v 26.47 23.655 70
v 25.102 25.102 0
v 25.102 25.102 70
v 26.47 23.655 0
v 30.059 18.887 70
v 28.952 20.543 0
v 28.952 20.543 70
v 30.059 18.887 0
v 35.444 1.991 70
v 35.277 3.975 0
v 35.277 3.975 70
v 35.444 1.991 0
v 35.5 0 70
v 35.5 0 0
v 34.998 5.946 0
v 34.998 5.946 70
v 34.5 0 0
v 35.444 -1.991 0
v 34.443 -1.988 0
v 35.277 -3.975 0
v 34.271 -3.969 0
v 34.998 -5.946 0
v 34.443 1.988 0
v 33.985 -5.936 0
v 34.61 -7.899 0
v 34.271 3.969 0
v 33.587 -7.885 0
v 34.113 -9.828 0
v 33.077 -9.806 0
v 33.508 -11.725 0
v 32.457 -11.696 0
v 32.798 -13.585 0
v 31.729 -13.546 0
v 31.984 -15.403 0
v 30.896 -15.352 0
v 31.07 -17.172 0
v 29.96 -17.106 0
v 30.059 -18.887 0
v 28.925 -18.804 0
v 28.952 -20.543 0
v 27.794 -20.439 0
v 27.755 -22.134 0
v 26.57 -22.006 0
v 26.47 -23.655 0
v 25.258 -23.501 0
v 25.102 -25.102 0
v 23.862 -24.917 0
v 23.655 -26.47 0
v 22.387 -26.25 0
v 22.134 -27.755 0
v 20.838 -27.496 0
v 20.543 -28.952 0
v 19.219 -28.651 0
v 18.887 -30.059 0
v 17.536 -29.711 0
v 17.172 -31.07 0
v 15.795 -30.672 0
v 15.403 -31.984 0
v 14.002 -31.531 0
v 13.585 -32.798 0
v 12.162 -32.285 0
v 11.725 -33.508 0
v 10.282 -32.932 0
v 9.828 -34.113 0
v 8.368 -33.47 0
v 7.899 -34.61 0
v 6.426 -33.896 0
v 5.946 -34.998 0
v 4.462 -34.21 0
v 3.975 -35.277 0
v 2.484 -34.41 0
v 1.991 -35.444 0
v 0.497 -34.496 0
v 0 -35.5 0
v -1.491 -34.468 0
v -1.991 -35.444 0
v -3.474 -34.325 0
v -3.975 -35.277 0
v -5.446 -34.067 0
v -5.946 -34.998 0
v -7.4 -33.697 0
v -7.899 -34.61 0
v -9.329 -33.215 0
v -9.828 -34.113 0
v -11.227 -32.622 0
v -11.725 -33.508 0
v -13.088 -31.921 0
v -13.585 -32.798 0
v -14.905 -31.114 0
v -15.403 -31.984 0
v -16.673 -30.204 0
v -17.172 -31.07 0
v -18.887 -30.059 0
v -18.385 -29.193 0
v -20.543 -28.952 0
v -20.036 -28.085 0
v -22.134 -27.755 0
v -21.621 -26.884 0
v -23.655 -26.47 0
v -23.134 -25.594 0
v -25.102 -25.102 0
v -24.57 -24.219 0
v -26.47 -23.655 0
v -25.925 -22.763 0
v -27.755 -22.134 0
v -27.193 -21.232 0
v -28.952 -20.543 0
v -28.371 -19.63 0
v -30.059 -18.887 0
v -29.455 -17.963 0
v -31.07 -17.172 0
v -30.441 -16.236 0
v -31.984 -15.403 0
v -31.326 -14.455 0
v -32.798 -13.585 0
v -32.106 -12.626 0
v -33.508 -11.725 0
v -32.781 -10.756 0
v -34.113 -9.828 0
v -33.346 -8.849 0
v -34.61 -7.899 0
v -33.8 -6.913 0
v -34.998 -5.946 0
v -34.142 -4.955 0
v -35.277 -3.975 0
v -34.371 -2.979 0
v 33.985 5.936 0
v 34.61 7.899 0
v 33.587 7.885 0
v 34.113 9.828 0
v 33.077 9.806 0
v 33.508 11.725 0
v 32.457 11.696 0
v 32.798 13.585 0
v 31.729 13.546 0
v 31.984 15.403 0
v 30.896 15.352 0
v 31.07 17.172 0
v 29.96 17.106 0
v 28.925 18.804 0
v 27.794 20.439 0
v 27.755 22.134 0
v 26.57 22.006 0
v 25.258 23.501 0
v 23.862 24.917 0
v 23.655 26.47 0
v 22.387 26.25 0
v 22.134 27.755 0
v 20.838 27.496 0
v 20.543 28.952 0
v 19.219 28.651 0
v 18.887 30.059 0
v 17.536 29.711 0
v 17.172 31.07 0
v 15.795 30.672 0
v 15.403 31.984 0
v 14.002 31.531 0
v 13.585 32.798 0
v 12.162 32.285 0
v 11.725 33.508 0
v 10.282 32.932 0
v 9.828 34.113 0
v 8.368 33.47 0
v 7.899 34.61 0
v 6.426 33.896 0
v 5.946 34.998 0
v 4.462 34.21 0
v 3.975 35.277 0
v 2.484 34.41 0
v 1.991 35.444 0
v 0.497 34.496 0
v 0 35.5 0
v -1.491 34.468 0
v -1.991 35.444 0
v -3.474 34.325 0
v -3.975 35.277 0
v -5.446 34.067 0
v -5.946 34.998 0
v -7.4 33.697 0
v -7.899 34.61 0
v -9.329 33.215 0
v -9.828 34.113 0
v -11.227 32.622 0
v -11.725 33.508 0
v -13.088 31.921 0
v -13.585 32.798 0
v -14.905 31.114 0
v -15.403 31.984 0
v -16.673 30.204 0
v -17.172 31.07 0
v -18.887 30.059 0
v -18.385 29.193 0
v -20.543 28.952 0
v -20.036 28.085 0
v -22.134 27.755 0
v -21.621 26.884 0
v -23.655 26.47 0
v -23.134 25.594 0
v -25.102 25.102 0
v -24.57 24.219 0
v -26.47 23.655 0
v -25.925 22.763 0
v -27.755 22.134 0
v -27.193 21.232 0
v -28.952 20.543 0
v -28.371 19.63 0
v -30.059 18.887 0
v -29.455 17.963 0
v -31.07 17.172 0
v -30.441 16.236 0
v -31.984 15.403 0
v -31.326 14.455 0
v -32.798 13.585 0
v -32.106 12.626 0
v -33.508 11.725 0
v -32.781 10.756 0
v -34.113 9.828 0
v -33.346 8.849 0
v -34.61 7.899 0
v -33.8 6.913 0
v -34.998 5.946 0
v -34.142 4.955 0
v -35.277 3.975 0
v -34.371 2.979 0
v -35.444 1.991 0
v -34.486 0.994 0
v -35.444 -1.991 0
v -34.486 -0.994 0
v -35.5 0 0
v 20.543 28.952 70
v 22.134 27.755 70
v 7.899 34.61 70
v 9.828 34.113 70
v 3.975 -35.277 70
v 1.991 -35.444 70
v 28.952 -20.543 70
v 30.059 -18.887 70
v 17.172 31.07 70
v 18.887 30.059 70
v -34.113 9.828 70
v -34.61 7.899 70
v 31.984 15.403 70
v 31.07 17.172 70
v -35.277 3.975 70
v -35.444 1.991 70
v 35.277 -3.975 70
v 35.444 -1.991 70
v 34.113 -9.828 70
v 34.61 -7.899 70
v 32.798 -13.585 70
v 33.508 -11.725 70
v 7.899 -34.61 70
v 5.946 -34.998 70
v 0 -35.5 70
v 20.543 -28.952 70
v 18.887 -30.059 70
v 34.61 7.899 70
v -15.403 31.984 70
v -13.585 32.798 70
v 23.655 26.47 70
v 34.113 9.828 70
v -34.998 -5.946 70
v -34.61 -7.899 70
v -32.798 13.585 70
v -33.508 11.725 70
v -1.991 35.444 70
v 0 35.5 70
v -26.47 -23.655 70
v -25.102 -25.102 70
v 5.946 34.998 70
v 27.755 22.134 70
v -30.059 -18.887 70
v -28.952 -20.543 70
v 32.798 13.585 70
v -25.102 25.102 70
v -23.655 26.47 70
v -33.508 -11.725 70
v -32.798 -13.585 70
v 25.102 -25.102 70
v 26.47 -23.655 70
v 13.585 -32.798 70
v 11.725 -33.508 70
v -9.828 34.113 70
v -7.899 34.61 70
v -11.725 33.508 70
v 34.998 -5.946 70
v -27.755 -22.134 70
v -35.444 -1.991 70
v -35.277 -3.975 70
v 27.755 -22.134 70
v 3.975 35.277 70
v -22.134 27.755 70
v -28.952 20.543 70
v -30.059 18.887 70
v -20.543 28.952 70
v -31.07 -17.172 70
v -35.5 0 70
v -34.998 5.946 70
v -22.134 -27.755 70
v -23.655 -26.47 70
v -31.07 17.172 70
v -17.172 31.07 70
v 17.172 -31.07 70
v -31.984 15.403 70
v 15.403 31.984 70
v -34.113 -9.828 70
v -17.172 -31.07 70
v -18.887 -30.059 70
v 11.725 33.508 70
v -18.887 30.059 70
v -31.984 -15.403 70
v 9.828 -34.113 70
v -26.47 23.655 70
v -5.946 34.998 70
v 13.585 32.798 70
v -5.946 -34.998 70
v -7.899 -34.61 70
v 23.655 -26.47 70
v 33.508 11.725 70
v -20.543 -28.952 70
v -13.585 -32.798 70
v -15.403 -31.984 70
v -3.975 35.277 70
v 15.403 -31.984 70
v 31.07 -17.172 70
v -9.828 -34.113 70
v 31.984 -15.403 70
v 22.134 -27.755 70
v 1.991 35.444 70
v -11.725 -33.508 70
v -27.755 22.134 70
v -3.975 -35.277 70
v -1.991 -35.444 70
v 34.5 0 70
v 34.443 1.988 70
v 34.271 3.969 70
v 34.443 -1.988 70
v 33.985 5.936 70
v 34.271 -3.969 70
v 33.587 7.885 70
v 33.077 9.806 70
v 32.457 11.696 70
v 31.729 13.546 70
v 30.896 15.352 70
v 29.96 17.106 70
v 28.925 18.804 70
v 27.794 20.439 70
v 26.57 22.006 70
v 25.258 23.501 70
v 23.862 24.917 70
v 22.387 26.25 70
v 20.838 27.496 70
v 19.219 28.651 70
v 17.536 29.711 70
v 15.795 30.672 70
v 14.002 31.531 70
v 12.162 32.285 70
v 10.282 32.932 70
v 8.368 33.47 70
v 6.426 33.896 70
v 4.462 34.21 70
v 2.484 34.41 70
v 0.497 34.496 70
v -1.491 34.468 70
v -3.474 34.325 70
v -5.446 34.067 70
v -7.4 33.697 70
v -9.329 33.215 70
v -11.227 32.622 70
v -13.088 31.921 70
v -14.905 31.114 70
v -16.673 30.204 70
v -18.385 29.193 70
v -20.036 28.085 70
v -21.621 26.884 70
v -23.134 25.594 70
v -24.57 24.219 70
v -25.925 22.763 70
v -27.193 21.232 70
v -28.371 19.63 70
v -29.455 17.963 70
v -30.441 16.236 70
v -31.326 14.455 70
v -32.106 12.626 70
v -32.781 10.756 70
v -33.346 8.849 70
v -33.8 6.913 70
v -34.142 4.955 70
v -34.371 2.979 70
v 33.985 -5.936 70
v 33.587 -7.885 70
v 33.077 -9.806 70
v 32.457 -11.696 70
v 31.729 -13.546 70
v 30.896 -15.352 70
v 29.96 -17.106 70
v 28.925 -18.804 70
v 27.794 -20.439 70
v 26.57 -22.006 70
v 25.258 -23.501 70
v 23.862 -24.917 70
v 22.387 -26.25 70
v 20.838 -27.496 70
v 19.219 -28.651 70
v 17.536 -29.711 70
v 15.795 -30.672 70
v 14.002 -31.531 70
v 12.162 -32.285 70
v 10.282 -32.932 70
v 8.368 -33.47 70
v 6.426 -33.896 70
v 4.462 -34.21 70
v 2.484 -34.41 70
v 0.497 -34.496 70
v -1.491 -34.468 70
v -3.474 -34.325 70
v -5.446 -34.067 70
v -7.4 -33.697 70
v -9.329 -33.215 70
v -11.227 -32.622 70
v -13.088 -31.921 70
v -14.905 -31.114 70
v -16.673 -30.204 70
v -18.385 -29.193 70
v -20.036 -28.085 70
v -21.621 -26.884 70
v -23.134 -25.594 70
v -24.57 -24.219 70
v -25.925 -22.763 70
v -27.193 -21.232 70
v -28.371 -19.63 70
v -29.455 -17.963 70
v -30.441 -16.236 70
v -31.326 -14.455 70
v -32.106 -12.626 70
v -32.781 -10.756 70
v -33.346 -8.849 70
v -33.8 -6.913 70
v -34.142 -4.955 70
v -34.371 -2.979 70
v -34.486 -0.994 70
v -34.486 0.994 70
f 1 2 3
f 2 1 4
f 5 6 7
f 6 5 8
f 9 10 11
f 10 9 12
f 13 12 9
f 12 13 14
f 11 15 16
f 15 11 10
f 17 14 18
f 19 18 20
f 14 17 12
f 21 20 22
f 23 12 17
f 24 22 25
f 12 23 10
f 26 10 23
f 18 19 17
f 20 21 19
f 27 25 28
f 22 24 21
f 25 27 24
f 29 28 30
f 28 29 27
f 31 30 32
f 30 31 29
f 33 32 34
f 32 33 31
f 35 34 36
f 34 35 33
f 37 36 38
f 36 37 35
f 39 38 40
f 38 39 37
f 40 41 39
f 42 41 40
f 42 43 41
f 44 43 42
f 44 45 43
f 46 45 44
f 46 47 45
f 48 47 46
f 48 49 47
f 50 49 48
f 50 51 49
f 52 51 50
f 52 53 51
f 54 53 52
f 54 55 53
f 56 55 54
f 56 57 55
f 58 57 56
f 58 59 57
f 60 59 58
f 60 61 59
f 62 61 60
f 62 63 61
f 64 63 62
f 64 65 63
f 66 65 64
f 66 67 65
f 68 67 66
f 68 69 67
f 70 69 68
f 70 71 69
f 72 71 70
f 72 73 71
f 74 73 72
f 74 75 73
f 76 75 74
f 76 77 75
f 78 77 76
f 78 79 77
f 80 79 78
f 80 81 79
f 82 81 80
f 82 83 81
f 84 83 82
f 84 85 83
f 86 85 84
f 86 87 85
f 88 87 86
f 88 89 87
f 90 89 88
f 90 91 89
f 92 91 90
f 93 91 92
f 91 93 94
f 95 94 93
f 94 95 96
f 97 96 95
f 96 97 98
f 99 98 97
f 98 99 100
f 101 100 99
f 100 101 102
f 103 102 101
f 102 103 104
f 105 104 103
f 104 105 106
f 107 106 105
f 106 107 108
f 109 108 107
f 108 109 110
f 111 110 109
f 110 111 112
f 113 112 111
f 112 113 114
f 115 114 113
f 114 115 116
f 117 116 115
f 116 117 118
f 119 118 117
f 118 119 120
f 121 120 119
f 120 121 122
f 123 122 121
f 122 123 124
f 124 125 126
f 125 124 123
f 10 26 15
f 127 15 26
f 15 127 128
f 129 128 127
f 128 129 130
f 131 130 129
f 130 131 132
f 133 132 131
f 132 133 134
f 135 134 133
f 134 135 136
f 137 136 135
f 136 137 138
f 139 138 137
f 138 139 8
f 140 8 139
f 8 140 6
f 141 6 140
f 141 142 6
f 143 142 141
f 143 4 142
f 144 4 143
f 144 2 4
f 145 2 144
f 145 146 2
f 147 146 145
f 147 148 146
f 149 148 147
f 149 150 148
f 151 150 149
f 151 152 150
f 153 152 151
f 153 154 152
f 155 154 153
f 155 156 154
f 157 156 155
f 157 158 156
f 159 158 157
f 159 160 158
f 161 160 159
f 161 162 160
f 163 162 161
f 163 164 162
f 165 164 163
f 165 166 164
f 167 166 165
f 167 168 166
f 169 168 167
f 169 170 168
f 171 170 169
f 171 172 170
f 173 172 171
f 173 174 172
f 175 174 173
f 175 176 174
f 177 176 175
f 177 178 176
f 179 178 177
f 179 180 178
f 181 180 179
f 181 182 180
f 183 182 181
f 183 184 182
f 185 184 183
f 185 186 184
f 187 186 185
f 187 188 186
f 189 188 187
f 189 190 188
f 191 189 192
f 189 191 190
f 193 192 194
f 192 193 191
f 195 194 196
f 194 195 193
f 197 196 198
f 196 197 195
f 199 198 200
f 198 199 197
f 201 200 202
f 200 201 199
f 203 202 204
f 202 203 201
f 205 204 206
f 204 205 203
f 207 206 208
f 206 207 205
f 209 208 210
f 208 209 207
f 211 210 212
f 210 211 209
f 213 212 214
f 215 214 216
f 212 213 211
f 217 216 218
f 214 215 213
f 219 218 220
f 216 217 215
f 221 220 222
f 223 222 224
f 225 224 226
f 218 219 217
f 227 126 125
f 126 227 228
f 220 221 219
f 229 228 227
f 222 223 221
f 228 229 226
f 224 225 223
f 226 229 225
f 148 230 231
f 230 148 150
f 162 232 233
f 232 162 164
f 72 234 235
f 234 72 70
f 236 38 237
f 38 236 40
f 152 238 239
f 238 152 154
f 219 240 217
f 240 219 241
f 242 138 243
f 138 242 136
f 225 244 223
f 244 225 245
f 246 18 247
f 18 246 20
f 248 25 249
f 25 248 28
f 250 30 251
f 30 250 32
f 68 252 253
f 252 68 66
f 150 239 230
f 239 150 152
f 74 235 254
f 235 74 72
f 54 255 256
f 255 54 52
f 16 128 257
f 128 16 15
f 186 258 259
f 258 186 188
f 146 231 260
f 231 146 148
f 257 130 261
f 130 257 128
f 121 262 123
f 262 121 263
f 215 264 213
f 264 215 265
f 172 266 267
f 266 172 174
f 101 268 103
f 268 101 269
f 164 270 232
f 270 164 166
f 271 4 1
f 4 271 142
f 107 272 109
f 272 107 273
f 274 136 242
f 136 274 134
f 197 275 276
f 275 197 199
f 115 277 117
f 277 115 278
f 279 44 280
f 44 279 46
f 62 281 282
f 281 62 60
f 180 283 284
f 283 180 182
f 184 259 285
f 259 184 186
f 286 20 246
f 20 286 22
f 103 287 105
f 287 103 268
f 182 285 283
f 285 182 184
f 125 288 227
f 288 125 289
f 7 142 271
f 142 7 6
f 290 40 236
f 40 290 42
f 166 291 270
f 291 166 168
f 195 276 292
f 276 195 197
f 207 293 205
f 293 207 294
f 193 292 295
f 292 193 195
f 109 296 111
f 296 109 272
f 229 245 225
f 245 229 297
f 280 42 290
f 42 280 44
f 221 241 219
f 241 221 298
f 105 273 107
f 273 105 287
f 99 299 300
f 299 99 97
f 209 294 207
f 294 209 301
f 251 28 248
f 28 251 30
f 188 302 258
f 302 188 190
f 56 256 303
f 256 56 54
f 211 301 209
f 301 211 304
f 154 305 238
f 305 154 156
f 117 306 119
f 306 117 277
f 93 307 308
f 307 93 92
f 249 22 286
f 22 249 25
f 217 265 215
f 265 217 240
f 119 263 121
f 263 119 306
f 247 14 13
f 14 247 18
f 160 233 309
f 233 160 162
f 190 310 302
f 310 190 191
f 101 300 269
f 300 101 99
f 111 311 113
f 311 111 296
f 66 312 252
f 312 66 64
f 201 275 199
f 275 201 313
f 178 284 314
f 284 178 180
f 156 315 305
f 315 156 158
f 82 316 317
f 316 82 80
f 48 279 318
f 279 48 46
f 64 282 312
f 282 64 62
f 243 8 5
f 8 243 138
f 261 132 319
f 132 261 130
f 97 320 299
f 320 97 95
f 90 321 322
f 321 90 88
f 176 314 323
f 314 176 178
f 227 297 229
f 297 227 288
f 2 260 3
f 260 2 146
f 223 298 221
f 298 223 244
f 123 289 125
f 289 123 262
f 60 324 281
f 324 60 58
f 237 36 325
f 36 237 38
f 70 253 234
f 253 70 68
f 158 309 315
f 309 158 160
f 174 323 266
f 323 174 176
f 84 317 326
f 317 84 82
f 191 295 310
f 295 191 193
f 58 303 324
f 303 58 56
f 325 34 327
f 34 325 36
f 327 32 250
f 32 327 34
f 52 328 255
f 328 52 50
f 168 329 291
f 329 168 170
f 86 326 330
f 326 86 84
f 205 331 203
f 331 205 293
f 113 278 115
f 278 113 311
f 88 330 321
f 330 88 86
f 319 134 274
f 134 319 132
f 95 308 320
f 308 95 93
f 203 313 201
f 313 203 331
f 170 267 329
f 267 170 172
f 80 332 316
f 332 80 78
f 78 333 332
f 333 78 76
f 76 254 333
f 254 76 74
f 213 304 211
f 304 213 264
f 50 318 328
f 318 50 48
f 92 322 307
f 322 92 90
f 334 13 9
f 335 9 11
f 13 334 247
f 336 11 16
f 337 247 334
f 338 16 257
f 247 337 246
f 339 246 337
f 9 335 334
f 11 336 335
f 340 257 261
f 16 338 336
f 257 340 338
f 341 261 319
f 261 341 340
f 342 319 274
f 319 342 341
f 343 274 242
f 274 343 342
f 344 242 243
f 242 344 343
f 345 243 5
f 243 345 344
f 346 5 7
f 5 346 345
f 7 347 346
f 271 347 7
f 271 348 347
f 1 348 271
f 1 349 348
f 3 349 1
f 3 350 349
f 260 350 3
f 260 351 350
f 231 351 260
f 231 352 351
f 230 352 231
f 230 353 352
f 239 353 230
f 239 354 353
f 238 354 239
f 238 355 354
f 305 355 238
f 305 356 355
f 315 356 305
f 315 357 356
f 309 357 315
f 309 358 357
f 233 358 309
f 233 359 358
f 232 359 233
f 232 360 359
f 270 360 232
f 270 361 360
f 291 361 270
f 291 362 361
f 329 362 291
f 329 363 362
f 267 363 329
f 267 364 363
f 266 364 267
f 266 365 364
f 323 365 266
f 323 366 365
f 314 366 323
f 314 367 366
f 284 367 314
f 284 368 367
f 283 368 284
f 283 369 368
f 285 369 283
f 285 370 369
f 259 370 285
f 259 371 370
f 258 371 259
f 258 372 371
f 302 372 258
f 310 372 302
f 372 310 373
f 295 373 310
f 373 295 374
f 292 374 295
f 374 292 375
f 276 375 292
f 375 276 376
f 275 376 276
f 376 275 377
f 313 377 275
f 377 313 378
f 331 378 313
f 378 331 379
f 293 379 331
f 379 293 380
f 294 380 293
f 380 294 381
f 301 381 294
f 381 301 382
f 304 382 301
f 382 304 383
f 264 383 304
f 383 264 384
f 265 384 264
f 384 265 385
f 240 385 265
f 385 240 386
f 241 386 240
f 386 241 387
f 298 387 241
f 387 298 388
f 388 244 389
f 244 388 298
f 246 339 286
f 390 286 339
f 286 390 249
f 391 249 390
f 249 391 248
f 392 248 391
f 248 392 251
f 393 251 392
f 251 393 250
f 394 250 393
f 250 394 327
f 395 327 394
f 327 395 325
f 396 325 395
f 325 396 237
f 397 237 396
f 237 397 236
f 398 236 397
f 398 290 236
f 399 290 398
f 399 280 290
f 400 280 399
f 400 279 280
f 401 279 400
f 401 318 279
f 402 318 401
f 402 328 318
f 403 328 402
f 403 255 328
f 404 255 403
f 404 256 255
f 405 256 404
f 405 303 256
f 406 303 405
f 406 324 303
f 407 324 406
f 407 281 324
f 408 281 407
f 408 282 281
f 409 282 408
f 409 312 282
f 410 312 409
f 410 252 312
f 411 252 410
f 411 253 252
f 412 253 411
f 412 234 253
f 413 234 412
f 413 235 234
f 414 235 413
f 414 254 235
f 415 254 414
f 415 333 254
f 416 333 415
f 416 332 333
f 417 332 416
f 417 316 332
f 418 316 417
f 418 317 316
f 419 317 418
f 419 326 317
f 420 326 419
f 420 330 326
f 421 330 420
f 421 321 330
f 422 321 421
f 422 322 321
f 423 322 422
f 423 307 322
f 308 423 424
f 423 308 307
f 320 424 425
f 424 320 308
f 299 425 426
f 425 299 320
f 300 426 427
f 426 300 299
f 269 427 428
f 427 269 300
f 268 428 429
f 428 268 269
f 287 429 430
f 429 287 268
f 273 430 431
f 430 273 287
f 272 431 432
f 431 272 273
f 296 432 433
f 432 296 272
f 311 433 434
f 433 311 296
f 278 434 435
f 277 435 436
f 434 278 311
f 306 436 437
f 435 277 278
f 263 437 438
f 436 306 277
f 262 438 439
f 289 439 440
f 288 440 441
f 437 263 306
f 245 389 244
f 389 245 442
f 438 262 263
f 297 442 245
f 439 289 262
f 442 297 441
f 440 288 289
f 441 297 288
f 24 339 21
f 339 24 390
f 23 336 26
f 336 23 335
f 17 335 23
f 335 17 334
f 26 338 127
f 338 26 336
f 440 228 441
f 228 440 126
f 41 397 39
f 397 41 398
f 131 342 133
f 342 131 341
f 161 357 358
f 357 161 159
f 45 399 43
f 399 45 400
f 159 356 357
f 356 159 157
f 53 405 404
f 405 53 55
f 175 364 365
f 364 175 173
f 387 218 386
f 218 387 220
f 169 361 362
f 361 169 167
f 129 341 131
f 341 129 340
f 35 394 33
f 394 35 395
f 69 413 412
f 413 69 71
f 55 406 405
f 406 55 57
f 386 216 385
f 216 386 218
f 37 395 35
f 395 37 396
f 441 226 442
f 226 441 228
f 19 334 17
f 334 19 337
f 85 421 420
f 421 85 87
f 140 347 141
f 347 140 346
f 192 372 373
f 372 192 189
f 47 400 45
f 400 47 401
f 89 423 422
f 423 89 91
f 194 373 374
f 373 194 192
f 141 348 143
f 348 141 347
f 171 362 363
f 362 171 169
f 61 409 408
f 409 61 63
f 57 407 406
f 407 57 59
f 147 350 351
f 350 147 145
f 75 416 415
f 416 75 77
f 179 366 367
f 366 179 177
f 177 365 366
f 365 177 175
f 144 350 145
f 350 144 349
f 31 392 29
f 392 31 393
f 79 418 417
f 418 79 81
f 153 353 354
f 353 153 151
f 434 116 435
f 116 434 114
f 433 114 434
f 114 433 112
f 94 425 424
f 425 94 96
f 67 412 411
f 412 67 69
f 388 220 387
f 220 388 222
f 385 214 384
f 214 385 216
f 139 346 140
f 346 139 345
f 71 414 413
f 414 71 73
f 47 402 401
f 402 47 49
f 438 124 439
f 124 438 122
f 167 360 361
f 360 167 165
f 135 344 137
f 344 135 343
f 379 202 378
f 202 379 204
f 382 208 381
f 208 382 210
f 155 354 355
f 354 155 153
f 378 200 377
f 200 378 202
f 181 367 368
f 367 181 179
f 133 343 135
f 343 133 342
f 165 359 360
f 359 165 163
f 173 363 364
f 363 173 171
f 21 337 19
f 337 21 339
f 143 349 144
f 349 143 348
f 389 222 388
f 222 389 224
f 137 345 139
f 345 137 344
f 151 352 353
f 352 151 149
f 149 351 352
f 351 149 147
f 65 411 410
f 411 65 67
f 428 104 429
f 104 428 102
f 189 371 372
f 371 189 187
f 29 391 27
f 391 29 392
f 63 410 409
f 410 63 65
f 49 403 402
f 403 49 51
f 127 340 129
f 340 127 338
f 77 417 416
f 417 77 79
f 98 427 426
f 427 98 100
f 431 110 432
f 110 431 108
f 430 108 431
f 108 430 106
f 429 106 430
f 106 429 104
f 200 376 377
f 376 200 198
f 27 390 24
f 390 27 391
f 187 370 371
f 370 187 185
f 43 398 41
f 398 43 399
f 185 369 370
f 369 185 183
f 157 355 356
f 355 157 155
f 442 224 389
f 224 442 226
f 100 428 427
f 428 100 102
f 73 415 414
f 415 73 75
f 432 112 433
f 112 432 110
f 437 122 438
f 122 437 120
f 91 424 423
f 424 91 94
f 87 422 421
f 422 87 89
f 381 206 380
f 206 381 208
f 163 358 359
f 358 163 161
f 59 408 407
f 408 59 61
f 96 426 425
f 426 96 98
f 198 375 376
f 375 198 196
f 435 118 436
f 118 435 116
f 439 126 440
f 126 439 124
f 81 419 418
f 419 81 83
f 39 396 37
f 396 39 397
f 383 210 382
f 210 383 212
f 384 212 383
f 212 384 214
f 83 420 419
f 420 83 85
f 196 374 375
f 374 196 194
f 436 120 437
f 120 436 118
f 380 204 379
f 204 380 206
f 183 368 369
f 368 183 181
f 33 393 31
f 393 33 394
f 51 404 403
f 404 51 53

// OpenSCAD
$fa=0.1;
difference()
{
    cylinder(d=71,h=70);
    cylinder(d=69,h=70);
    
}
